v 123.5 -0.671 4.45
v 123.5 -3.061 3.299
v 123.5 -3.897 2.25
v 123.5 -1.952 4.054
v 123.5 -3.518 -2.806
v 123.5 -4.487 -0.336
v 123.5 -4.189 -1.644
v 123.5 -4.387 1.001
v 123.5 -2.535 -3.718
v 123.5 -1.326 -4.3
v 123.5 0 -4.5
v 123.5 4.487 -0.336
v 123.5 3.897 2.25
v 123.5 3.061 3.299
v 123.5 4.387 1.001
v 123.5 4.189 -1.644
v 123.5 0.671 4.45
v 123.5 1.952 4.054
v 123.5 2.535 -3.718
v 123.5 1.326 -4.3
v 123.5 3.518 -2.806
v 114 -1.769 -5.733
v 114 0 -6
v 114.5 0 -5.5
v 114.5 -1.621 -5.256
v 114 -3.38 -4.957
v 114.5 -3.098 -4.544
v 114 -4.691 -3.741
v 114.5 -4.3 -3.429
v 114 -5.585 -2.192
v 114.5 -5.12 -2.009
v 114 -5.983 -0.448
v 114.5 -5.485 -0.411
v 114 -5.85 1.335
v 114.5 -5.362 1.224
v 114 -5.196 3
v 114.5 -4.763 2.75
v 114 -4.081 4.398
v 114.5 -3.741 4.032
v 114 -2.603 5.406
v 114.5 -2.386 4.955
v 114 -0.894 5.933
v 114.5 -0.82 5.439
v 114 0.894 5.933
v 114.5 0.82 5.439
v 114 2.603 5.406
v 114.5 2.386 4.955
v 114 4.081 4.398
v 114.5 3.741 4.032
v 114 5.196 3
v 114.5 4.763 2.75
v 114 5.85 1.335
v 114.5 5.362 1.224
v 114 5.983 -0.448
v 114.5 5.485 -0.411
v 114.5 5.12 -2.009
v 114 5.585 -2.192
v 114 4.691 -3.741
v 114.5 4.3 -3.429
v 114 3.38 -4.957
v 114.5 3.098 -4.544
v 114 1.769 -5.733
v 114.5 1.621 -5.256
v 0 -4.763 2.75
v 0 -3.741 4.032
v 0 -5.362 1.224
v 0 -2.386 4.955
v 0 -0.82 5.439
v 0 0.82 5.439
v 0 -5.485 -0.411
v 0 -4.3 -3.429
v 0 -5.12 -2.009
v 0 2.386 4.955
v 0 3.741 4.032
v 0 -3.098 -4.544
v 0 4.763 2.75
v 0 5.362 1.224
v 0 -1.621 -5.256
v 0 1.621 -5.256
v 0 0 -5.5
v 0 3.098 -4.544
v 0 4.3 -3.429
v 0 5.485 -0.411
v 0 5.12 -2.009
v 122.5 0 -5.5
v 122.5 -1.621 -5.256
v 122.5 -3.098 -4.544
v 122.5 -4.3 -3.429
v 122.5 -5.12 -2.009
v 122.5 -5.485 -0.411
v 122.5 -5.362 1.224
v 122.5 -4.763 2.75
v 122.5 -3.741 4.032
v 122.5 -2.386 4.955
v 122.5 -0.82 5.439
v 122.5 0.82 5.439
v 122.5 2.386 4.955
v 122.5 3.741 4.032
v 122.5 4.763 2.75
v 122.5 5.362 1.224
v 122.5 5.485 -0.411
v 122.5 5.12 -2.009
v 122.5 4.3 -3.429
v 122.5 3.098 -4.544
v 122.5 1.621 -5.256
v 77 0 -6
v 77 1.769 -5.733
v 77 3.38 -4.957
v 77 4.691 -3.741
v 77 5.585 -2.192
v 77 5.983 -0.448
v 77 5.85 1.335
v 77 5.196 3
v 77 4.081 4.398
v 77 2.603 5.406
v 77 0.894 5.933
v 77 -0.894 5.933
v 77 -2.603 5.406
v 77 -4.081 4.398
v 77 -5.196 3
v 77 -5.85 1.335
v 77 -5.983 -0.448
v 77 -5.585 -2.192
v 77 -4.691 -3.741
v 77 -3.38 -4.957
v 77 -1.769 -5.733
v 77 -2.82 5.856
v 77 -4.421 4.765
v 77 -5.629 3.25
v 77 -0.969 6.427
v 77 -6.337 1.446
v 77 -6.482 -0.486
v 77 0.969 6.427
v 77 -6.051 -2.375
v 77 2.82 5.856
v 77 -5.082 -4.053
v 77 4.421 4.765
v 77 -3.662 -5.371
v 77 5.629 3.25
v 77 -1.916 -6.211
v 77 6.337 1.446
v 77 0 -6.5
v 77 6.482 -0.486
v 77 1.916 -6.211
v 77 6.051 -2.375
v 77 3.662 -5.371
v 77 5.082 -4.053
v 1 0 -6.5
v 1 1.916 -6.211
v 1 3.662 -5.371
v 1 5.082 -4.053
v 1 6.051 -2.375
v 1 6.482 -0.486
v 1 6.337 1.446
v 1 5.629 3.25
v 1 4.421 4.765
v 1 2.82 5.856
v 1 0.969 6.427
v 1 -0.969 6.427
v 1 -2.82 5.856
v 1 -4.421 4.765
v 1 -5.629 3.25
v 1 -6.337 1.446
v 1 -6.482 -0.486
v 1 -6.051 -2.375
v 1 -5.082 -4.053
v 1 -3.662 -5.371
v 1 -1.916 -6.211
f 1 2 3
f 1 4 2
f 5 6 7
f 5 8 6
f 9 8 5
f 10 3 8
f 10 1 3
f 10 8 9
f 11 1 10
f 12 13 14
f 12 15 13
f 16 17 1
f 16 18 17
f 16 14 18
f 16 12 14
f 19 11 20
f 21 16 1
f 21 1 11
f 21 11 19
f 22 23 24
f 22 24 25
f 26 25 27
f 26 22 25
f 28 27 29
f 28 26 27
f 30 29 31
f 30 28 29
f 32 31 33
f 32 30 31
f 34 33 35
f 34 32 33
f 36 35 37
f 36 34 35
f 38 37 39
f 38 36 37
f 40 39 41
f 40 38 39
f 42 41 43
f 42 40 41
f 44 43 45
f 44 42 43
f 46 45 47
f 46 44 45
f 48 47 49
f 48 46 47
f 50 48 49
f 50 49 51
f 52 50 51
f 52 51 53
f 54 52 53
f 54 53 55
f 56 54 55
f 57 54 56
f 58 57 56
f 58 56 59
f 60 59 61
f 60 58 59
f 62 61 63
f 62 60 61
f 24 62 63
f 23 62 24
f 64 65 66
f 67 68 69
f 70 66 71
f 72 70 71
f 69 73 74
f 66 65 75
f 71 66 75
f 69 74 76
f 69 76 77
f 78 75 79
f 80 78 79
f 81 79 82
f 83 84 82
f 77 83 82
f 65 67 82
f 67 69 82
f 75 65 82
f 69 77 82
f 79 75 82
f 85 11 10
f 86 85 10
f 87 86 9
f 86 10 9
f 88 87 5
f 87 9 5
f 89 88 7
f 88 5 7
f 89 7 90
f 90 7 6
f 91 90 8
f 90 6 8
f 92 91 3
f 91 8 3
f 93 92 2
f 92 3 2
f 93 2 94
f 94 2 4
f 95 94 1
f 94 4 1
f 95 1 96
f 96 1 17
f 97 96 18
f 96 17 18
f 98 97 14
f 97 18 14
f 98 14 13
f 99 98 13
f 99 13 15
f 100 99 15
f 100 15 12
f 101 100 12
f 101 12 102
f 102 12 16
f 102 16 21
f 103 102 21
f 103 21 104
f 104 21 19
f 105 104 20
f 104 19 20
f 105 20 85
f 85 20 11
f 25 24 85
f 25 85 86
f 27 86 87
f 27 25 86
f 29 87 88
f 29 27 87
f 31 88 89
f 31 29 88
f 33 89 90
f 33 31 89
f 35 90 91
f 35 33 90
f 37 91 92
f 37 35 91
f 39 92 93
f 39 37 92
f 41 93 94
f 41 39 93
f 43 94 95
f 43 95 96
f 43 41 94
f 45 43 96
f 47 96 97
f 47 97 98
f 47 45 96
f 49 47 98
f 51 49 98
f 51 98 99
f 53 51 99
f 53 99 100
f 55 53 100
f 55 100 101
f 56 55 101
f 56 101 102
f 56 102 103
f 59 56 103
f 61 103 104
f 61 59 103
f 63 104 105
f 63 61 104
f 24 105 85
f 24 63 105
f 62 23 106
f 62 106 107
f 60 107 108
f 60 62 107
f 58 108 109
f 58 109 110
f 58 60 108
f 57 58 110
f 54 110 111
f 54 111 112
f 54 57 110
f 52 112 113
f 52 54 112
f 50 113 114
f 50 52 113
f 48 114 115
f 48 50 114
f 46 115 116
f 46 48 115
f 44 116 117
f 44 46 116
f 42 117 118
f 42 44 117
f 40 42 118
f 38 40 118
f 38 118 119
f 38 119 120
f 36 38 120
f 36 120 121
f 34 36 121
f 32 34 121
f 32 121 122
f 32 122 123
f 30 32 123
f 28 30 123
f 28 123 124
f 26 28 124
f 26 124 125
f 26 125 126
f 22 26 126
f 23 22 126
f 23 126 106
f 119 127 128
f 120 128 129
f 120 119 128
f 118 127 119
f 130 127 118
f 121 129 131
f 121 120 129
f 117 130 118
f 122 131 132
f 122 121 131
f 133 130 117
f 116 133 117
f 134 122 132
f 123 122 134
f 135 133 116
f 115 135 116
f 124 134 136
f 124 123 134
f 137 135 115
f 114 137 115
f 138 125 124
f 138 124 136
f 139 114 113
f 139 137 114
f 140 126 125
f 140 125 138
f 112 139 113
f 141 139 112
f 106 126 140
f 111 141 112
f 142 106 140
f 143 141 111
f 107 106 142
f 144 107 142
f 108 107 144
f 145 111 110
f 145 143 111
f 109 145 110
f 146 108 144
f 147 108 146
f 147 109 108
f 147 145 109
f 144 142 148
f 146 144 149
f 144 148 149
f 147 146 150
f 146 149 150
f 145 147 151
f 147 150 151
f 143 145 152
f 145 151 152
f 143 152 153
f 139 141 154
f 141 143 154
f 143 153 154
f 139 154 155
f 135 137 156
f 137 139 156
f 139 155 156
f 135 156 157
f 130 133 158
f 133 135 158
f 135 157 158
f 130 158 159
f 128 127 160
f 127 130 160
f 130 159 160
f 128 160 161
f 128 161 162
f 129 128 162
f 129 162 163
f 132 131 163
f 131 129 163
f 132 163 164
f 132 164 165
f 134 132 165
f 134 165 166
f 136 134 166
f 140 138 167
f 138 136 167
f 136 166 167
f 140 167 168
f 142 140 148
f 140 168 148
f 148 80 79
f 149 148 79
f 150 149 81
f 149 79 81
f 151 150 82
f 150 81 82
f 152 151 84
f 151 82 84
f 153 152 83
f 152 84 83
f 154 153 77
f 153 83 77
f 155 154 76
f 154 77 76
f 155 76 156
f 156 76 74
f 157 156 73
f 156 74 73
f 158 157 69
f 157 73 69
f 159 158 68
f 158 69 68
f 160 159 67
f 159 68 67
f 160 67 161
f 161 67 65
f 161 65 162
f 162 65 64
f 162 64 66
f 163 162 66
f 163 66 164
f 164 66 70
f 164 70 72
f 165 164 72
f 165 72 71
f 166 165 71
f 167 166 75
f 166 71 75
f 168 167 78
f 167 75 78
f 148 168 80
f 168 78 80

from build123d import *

# Parameters (mm, degrees)
SKETCH1_R          = 6.5
EXTRUDE1_DEPTH     = 123.5
SKETCH2_OUTSIDE_W  = 39.972
SKETCH2_OUTSIDE_H  = 39.972
SKETCH2_OUTSIDE_R  = 6
CUT_EXTRUDE1_DEPTH = 46.5
CHAMFER1_SIZE      = 1


with BuildPart() as part:
    # Sketch1 → Extrude1 (new body)
    with BuildSketch(Plane(origin=(0, 0, 0), x_dir=(0, 0, -1), z_dir=(1, 0, 0))):
        Circle(SKETCH1_R)
    extrude(amount=EXTRUDE1_DEPTH)

    # Sketch2 outside → Cut-Extrude1 (cut)
    with BuildSketch(Plane(origin=(123.5, 0, 0), x_dir=(0, 0, -1), z_dir=(1, 0, 0))):
        Rectangle(SKETCH2_OUTSIDE_W, SKETCH2_OUTSIDE_H)
        Circle(SKETCH2_OUTSIDE_R, mode=Mode.SUBTRACT)
    extrude(amount=-CUT_EXTRUDE1_DEPTH, mode=Mode.SUBTRACT)

    # Sketch3 → Cut-Revolve1 (revolve, cut)
    with BuildSketch(Plane.XY, mode=Mode.PRIVATE) as cut_revolve1_sk:
        Polygon((123.5, 10.253952542), (123.5, 5.5), (114.5, 5.5), (112.600148555, 7.399851445), (112.600148555, 10.253952542), align=None)
    revolve(cut_revolve1_sk.sketch.rotate(Axis((127.965017679, 0, 0), (-1, 0, 0)), 90), axis=Axis((127.965017679, 0, 0), (-1, 0, 0)), mode=Mode.SUBTRACT)

    # Chamfer1
    chamfer1_edges = [part.edges().sort_by_distance(p)[0] for p in [
        (0, 0, 6.5),
        (123.5, 0, 5.5),
    ]]
    chamfer(chamfer1_edges, length=CHAMFER1_SIZE)


solid = part.part
